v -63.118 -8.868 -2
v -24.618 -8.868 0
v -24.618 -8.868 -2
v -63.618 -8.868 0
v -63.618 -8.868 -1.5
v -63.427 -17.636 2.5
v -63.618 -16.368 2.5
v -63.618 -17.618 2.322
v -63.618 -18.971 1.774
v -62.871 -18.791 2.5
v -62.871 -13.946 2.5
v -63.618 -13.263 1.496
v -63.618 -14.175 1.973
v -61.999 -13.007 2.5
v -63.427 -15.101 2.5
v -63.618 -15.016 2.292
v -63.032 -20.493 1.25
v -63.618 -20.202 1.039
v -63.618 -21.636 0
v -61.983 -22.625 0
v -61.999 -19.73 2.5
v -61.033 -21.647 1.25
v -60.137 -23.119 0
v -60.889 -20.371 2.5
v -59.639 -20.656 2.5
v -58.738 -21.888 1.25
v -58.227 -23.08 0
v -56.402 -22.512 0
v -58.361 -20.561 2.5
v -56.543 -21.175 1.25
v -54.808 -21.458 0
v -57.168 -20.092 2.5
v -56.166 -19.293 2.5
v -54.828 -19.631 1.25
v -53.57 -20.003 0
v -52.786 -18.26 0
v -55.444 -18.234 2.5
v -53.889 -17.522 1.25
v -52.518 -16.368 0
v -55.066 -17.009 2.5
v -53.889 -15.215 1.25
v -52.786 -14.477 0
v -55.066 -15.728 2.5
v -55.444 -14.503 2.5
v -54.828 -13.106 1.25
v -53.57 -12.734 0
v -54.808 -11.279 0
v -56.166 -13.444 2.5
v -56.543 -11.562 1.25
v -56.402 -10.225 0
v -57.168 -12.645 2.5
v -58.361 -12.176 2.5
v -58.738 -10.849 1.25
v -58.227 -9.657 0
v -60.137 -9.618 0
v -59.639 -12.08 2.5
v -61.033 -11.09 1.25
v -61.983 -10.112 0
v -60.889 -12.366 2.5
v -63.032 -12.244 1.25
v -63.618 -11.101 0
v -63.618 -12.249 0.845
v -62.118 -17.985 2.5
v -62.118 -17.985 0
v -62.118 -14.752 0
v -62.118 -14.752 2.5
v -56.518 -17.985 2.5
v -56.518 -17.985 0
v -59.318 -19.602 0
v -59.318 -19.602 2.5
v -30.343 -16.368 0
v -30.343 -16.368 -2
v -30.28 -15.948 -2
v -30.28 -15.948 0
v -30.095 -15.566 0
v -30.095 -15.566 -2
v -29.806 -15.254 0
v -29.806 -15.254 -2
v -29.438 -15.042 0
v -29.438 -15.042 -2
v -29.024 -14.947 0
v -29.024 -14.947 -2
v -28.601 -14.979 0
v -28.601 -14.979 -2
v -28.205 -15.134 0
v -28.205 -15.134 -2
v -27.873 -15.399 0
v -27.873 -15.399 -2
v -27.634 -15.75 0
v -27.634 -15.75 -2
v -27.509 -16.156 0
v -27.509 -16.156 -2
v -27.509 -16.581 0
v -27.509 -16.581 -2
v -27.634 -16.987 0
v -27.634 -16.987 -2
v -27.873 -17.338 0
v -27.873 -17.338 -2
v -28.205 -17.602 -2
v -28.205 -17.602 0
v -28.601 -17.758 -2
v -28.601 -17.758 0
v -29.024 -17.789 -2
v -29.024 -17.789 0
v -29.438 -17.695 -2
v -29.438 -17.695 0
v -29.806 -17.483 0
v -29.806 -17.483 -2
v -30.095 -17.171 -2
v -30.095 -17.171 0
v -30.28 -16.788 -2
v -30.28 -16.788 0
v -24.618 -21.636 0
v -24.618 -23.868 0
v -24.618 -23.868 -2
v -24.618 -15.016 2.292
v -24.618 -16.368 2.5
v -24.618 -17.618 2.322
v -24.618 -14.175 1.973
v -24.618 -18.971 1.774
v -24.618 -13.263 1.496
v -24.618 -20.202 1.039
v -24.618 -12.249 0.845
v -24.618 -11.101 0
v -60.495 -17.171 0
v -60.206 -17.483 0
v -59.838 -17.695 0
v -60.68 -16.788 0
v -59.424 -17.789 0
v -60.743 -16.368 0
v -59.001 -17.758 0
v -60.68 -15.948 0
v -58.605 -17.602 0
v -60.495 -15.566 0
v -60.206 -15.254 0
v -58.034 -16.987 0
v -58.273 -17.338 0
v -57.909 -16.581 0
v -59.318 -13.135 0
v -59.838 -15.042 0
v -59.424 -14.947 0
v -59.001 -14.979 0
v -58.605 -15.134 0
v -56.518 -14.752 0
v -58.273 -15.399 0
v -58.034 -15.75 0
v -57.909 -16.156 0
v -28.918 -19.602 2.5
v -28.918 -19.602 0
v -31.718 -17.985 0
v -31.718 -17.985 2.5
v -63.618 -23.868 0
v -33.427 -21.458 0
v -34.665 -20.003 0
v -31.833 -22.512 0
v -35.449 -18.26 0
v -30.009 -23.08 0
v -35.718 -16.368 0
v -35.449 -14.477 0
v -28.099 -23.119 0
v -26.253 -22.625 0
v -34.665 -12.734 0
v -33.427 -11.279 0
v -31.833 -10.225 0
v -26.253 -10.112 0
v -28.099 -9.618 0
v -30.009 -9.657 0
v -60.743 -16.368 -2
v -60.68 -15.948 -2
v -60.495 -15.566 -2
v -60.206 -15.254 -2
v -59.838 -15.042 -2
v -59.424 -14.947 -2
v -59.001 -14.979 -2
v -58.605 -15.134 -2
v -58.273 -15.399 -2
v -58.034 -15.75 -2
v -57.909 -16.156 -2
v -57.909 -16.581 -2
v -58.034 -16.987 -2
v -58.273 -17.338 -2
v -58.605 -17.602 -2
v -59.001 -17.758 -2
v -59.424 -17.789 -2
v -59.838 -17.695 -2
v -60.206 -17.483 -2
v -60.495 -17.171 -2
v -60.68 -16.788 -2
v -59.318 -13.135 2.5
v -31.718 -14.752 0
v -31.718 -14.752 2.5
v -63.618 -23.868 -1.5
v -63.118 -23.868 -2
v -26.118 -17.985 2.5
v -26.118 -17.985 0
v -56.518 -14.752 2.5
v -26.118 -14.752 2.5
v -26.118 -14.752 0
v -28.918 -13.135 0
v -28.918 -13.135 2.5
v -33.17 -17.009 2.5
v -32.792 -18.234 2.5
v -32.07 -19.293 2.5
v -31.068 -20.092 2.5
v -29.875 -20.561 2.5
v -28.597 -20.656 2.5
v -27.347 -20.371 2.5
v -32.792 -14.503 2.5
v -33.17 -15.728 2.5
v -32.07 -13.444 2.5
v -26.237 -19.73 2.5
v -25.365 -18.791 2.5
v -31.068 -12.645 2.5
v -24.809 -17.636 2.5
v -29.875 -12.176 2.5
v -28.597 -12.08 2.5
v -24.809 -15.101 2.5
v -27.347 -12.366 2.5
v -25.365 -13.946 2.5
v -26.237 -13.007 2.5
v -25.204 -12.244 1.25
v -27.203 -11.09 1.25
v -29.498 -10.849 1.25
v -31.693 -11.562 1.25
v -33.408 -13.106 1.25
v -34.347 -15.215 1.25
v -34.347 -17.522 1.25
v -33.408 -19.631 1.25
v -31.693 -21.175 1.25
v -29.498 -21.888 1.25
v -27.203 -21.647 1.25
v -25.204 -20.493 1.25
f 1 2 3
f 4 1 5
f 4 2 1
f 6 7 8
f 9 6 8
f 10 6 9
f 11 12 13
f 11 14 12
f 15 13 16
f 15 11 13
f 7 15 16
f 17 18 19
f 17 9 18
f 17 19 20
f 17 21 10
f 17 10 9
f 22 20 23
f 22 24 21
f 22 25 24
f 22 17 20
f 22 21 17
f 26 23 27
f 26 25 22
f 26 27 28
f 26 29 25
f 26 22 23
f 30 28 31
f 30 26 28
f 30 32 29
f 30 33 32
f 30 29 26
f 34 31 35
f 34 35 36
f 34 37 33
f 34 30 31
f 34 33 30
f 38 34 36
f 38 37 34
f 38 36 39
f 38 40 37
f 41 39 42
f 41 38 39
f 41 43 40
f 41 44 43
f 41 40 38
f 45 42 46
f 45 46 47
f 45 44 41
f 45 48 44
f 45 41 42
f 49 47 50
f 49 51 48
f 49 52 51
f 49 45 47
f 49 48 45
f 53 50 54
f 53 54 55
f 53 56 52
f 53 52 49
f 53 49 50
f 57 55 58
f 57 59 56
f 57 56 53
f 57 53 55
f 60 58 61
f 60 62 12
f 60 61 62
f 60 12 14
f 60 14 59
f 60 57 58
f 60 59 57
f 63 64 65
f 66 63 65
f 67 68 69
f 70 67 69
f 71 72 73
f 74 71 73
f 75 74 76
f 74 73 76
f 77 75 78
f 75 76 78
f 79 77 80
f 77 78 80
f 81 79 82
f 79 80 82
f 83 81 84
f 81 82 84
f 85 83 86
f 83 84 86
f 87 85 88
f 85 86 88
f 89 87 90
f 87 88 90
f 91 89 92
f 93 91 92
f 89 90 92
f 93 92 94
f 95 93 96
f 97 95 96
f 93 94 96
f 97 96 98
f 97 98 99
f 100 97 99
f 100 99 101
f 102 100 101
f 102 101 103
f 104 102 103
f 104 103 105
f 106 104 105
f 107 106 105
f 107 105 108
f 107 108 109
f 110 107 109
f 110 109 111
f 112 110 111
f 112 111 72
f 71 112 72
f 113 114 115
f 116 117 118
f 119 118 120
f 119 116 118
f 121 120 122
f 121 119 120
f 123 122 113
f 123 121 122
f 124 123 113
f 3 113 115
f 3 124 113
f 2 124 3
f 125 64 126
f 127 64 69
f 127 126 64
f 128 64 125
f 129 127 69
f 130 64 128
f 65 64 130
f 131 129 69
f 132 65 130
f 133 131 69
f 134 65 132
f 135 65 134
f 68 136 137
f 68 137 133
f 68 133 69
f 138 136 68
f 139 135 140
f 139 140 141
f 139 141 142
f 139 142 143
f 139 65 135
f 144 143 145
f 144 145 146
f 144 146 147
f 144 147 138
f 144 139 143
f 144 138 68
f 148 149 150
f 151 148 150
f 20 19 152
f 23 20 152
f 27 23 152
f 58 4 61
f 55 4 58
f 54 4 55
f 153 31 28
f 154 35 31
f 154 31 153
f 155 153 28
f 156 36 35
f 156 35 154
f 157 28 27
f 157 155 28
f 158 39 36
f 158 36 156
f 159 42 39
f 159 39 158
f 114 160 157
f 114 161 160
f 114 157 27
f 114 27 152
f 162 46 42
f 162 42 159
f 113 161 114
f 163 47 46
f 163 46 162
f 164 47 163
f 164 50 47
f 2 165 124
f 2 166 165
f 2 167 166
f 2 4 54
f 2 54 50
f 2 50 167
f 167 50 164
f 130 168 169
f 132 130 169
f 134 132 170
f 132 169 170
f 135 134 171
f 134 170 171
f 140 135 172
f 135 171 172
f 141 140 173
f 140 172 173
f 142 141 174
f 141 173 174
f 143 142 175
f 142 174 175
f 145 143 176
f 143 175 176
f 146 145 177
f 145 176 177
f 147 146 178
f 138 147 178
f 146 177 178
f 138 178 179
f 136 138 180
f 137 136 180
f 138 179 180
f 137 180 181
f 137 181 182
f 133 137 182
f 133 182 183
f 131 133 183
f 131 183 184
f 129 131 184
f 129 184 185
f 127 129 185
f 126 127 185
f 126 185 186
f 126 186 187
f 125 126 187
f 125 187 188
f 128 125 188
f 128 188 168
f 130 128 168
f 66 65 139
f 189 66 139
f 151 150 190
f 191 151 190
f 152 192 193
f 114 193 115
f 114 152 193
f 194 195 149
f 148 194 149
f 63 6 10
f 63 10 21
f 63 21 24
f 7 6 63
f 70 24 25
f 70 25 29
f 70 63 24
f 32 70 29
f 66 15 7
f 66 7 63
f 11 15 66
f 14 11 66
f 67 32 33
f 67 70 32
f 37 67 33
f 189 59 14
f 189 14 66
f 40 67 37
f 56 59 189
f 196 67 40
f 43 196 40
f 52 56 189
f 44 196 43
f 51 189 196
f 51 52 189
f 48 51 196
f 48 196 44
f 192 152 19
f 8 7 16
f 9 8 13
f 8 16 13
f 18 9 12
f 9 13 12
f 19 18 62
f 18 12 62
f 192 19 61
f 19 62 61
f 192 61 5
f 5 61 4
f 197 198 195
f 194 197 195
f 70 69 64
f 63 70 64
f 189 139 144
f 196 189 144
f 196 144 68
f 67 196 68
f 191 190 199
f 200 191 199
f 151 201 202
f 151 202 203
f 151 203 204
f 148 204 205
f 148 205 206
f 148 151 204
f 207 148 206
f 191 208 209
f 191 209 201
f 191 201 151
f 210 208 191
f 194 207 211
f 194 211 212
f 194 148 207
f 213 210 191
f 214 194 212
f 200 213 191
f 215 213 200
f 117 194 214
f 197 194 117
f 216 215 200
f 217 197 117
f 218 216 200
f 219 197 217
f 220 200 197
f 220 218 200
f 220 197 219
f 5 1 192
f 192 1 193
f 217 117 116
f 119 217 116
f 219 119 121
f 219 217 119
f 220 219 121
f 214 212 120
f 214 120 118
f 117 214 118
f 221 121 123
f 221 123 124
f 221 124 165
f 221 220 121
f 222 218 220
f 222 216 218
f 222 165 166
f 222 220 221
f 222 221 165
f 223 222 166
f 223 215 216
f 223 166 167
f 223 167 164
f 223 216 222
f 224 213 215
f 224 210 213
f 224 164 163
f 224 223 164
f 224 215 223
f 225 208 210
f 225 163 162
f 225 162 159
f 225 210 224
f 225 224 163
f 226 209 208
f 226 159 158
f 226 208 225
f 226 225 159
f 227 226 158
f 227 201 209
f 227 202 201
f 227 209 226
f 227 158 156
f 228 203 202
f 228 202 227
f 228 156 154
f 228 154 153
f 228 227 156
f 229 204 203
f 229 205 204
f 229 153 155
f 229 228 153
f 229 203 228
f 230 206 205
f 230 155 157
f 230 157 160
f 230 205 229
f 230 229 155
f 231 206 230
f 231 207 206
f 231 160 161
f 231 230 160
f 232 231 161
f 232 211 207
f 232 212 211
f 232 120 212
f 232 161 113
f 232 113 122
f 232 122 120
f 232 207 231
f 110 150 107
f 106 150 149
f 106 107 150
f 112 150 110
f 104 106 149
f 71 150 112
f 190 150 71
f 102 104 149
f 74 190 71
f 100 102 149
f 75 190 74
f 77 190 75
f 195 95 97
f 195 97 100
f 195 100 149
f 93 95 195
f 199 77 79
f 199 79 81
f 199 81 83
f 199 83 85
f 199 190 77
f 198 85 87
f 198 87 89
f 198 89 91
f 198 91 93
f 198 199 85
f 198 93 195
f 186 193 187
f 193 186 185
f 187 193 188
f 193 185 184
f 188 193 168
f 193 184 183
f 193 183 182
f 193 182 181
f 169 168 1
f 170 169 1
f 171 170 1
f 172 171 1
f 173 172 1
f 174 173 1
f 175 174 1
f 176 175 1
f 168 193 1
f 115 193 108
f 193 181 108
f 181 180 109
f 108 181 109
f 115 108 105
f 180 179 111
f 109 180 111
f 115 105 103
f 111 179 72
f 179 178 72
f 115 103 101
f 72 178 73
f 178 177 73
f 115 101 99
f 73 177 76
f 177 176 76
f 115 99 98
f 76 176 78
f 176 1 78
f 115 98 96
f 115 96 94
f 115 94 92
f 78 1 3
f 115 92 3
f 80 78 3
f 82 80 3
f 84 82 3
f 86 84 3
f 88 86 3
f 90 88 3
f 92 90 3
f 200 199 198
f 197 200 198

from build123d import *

# Parameters (mm, degrees)
F0_R     = 4.3
F1_DEPTH = 2
F2_D     = 2.85
F2_DEPTH = 11
F2_TIP   = 0.8562263821
F3_DEPTH = 2.5
F5_SIZE  = 0.5


# Not quite as in the source:
# - a fillet or chamfer that OpenCascade refuses, or shapes differently, is made with other operations: its cross-section is extruded or revolved along the edge and cut away or added


with BuildPart() as f1:
    # F0 (on Top) → F1 (new body)
    with BuildSketch(Plane.XY):
        Polygon((-24.6178394498, -8.8684120262), (-63.6178394498, -8.8684120262), (-63.6178394498, -16.3684120262), (-63.6178394498, -23.8684120262), (-24.6178394498, -23.8684120262), (-24.6178394498, -16.3684120262), align=None)
        with BuildLine():
            ThreePointArc((-55.0178394498, -16.3684120262), (-59.3178394498, -20.6684120262), (-63.6178394498, -16.3684120262))
            ThreePointArc((-63.6178394498, -16.3684120262), (-59.3178394498, -12.0684120262), (-55.0178394498, -16.3684120262))
        make_face(mode=Mode.SUBTRACT)
        with Locations((-28.9178394498, -16.3684120262)):
            Circle(F0_R, mode=Mode.SUBTRACT)
        with BuildLine():
            ThreePointArc((-55.0178394498, -16.3684120262), (-59.3178394498, -12.0684120262), (-63.6178394498, -16.3684120262))
            ThreePointArc((-63.6178394498, -16.3684120262), (-59.3178394498, -20.6684120262), (-55.0178394498, -16.3684120262))
        make_face()
        Polygon((-59.3178394498, -13.1352505188), (-56.5178394498, -14.7518312725), (-56.5178394498, -17.98499278), (-59.3178394498, -19.6015735337), (-62.1178394498, -17.98499278), (-62.1178394498, -14.7518312725), align=None, mode=Mode.SUBTRACT)
        with Locations((-28.9178394498, -16.3684120262)):
            Circle(F0_R)
        Polygon((-28.9178394498, -13.1352505188), (-26.1178394498, -14.7518312725), (-26.1178394498, -17.98499278), (-28.9178394498, -19.6015735337), (-31.7178394498, -17.98499278), (-31.7178394498, -14.7518312725), align=None, mode=Mode.SUBTRACT)
        Polygon((-56.5178394498, -17.98499278), (-56.5178394498, -14.7518312725), (-59.3178394498, -13.1352505188), (-62.1178394498, -14.7518312725), (-62.1178394498, -17.98499278), (-59.3178394498, -19.6015735337), align=None)
        Polygon((-26.1178394498, -17.98499278), (-26.1178394498, -14.7518312725), (-28.9178394498, -13.1352505188), (-31.7178394498, -14.7518312725), (-31.7178394498, -17.98499278), (-28.9178394498, -19.6015735337), align=None)
    extrude(amount=-F1_DEPTH)

    # F2
    with Locations(Plane.XY):
        with Locations((-59.3178394498, -16.3684120262), (-28.9178394498, -16.3684120262)):
            Hole(F2_D / 2, depth=F2_DEPTH)
            with Locations((0, 0, -(F2_DEPTH + F2_TIP / 2))):  # 118° drill point
                Cone(0, F2_D / 2, F2_TIP, mode=Mode.SUBTRACT)

    # F0 (on Top) → F3 (join)
    with BuildSketch(Plane.XY):
        with BuildLine():
            ThreePointArc((-55.0178394498, -16.3684120262), (-59.3178394498, -12.0684120262), (-63.6178394498, -16.3684120262))
            ThreePointArc((-63.6178394498, -16.3684120262), (-59.3178394498, -20.6684120262), (-55.0178394498, -16.3684120262))
        make_face()
        Polygon((-59.3178394498, -13.1352505188), (-56.5178394498, -14.7518312725), (-56.5178394498, -17.98499278), (-59.3178394498, -19.6015735337), (-62.1178394498, -17.98499278), (-62.1178394498, -14.7518312725), align=None, mode=Mode.SUBTRACT)
        with Locations((-28.9178394498, -16.3684120262)):
            Circle(F0_R)
        Polygon((-28.9178394498, -13.1352505188), (-26.1178394498, -14.7518312725), (-26.1178394498, -17.98499278), (-28.9178394498, -19.6015735337), (-31.7178394498, -17.98499278), (-31.7178394498, -14.7518312725), align=None, mode=Mode.SUBTRACT)
    extrude(amount=F3_DEPTH)

    # F4: chamfer of 2.5 on 2 edges, made by hand


with BuildPart() as f4_tool2:
    # F4_s3 → F4_t4 (revolve)
    with BuildSketch(Plane.XZ.offset(16.3684120262)):
        Polygon((-66.1178394498, 0), (-63.6178394498, 2.5), (-63.6178394498, 0), align=None)
    revolve(axis=Axis((-59.3178394498, -16.3684120262, 0), (0, 0, 1)))

    split(bisect_by=Plane.YZ.offset(-63.6178394498), keep=Keep.TOP)


with BuildPart() as f1_1:
    add(f1.part)

    # F4_t1: union F4_tool2
    add(f4_tool2.part)


with BuildPart() as f4_tool7:
    # F4_s8 → F4_t9 (revolve)
    with BuildSketch(Plane.XZ.offset(16.3684120262)):
        Polygon((-22.1178394498, 0), (-24.6178394498, 2.5), (-24.6178394498, 0), align=None)
    revolve(axis=Axis((-28.9178394498, -16.3684120262, 0), (0, 0, 1)))

    split(bisect_by=Plane.YZ.offset(-24.6178394498), keep=Keep.BOTTOM)


with BuildPart() as f1_2:
    add(f1_1.part)

    # F4_t6: union F4_tool7
    add(f4_tool7.part)

    # F5
    f5_edges = [f1_2.edges().sort_by_distance(p)[0] for p in [
        (-63.617839, -16.368412, -2),
    ]]
    chamfer(f5_edges, length=F5_SIZE)


solid = f1_2.part
